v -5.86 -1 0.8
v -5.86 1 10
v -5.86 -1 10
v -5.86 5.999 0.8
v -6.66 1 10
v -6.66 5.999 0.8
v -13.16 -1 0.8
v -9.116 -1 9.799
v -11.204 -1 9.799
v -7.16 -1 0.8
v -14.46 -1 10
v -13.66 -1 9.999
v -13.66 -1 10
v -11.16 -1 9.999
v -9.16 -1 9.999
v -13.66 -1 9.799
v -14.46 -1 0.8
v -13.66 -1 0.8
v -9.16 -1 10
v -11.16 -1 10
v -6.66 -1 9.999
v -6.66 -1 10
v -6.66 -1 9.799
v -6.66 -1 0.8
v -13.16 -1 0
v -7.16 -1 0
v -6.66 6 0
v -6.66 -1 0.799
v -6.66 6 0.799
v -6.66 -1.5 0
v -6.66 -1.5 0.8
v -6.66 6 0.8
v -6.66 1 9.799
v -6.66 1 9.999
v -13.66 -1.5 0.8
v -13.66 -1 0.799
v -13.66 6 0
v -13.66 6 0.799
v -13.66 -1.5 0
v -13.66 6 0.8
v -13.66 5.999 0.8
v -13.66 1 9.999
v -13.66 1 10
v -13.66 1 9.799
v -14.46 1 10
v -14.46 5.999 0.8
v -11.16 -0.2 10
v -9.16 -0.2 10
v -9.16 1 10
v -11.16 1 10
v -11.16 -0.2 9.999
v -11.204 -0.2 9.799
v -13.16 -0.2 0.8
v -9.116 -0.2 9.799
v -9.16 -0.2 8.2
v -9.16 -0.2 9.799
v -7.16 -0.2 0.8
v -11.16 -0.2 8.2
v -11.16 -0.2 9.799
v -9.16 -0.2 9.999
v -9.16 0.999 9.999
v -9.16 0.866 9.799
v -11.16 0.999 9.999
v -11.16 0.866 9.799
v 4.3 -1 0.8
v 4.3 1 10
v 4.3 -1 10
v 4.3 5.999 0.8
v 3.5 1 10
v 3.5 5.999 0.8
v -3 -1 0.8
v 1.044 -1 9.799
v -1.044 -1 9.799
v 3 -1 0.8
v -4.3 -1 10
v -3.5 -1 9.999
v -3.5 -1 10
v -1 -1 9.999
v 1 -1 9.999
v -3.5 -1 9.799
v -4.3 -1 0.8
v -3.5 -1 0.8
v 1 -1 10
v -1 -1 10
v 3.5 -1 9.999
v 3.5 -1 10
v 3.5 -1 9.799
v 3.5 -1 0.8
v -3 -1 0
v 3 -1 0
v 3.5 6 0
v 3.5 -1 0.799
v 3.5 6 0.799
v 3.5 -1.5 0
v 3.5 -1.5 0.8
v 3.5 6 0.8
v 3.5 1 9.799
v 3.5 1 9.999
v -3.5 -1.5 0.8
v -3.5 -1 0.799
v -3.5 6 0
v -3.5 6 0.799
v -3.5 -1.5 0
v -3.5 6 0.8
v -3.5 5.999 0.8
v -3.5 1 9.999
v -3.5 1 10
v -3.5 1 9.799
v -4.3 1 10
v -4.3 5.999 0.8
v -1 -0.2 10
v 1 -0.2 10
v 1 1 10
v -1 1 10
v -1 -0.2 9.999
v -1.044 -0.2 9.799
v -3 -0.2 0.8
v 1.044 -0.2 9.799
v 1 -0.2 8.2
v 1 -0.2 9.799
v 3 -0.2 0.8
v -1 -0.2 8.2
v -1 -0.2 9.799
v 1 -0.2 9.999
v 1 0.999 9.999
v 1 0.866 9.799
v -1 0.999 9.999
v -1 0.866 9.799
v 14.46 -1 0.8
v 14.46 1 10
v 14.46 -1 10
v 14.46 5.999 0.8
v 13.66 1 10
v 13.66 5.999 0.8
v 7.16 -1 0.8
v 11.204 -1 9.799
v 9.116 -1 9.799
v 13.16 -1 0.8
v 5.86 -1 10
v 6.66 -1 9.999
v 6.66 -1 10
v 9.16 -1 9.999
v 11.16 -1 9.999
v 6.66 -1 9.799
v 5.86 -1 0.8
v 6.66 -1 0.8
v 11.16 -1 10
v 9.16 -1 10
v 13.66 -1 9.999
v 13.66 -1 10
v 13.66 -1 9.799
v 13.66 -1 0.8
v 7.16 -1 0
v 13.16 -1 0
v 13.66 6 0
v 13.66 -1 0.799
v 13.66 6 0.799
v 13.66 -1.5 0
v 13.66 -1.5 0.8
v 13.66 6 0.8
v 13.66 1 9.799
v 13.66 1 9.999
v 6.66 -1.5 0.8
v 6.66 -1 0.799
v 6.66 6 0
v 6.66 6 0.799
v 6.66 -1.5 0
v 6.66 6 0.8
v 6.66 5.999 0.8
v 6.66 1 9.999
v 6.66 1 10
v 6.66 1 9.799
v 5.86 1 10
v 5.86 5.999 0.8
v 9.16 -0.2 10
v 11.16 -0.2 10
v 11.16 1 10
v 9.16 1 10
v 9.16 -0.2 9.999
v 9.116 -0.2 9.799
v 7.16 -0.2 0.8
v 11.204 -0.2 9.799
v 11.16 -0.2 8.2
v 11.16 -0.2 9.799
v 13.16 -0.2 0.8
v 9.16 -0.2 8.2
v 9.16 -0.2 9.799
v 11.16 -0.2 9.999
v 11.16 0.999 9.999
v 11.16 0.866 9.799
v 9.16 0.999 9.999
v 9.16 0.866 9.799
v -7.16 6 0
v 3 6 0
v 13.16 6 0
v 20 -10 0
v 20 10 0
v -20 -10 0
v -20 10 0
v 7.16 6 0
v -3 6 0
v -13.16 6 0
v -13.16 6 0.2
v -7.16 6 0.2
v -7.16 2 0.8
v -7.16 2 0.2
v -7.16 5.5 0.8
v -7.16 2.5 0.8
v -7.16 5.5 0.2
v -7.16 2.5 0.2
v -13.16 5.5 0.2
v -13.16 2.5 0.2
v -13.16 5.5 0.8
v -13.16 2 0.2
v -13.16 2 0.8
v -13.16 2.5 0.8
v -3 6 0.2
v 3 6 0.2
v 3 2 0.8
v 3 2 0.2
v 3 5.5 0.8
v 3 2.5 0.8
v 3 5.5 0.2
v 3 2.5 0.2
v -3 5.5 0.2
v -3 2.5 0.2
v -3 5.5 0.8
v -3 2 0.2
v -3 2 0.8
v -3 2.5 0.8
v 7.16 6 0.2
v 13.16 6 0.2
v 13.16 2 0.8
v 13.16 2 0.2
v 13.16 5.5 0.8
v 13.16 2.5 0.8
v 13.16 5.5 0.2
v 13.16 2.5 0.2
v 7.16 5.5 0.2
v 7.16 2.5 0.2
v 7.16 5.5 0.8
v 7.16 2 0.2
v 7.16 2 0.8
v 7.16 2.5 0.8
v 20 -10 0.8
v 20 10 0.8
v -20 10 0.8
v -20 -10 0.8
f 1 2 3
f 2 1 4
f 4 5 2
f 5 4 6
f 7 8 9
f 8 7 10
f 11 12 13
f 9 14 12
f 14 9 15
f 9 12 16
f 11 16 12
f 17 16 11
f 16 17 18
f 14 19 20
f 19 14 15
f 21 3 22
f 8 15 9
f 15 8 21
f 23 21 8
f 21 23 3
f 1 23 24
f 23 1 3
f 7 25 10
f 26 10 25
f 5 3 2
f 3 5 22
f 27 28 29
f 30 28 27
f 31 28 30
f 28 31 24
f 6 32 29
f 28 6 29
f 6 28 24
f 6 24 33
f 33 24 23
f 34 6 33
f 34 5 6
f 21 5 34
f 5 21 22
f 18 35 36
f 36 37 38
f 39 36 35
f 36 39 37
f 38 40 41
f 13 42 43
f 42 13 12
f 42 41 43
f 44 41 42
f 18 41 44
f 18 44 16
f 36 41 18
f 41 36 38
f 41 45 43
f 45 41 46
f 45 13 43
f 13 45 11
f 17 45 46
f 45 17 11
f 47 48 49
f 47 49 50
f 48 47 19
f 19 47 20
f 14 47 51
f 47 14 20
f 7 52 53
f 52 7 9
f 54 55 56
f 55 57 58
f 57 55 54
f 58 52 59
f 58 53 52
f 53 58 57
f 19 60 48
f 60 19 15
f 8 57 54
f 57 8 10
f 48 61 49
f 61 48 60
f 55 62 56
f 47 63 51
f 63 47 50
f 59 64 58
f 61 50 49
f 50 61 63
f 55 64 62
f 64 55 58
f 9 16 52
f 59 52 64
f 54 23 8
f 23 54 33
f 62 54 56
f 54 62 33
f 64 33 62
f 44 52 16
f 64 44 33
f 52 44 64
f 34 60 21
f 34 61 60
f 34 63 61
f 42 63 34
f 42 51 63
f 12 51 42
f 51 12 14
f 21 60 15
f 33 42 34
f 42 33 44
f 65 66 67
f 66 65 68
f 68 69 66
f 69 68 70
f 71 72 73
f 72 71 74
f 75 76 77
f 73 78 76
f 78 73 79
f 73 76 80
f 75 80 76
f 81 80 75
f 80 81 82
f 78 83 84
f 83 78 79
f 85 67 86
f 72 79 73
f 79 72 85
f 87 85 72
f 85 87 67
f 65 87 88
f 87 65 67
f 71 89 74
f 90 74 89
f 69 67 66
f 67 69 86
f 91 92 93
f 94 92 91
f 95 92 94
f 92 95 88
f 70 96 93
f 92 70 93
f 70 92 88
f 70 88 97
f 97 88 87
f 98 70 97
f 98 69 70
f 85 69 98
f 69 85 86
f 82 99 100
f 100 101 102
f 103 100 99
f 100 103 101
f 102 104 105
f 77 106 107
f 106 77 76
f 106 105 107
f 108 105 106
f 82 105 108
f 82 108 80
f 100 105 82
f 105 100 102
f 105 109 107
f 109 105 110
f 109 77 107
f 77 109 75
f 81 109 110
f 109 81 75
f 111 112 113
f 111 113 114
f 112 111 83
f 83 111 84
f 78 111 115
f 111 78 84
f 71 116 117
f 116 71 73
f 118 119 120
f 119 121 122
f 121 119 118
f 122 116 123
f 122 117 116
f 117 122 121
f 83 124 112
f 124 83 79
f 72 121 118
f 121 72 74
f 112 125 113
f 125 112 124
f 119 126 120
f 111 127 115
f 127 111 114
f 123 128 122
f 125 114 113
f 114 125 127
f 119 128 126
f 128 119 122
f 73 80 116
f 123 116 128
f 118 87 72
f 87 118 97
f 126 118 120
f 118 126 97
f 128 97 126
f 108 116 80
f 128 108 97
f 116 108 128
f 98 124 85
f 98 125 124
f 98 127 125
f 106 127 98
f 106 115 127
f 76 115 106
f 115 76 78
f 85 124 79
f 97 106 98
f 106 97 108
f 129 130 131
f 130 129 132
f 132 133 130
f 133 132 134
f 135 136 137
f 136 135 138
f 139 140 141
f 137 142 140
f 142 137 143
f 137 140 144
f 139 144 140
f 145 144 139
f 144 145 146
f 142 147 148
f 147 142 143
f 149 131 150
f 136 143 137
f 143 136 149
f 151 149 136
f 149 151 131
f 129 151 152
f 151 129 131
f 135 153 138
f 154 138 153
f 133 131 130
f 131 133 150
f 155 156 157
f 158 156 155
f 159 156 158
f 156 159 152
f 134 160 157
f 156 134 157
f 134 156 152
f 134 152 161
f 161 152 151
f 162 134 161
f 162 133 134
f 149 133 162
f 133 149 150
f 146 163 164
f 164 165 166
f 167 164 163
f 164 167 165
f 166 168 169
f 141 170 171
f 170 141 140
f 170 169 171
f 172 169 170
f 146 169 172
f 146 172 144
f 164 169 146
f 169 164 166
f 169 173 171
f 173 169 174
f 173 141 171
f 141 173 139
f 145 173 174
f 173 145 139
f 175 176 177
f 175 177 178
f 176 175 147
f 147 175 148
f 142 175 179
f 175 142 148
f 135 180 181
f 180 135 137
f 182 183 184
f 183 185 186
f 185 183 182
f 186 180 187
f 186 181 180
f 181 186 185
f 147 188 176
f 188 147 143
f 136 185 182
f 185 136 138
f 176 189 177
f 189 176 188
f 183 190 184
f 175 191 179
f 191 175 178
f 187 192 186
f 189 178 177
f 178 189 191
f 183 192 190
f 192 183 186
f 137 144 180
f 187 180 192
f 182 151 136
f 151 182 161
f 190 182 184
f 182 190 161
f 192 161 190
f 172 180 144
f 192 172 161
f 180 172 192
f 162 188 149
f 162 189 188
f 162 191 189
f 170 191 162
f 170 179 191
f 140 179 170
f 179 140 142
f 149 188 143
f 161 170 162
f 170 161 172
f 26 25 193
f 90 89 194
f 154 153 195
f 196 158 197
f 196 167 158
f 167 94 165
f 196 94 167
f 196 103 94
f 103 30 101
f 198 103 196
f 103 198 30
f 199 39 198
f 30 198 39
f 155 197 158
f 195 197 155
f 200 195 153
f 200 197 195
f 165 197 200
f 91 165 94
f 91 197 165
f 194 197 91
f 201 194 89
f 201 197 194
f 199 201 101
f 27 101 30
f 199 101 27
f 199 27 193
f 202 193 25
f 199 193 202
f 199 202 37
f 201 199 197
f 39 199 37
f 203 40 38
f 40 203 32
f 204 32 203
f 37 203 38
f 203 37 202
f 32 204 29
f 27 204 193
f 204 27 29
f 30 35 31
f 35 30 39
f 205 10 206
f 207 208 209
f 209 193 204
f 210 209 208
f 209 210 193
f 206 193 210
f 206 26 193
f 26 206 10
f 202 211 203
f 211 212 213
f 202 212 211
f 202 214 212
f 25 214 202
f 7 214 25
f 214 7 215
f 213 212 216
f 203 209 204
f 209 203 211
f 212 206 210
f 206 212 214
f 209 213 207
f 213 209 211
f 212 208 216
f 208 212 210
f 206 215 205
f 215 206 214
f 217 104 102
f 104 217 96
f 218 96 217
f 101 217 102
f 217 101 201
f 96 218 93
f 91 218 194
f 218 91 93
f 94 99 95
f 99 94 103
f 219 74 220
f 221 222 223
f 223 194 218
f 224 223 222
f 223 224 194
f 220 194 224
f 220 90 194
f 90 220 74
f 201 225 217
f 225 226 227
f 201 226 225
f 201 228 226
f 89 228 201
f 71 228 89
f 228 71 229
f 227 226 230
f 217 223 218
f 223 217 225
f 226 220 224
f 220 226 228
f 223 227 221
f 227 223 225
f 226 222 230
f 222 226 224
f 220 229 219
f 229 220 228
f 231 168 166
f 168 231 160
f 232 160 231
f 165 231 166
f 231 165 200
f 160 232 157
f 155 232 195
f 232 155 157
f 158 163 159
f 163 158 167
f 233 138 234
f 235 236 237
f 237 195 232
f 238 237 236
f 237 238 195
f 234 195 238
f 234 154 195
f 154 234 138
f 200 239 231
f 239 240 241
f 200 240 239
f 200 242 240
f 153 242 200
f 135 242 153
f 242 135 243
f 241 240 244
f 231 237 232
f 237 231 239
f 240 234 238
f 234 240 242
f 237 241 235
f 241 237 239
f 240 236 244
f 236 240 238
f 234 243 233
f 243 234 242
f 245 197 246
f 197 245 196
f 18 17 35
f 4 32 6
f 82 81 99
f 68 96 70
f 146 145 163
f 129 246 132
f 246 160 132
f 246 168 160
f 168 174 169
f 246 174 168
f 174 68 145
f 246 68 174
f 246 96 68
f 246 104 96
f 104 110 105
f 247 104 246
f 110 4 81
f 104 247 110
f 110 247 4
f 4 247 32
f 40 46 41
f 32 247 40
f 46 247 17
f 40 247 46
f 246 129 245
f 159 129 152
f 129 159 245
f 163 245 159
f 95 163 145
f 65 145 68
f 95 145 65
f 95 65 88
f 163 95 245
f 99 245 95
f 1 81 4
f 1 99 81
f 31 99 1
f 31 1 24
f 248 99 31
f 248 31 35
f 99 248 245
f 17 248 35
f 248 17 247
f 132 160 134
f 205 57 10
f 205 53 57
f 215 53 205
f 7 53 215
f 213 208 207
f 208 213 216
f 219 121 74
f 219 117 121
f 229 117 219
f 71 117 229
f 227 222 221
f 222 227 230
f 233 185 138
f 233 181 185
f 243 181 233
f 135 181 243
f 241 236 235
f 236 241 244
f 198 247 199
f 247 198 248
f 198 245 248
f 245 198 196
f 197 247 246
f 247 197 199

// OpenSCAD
e=.001;

w=6;
d=7;
height=10;
thickness=.8;


module button_keepout(w, d, thickness, height, top_width=2, top_height=3, gap=0.5, flex_thickness=0.2)
{
rotate([0,0,180])
{
difference()
{
translate([0,(d-top_width)/2,-height-e])
linear_extrude(height+e)
	translate([-w/2-gap, -d/2-gap])
	square([w+2*gap, d+gap]);

translate([0,(d-top_width)/2,-thickness-e])
linear_extrude(thickness+2*e)
	translate([-w/2, -d/2])
	square([w, d+e]);
}

translate([0,(d-top_width)/2,-thickness-e])
linear_extrude(thickness-flex_thickness+e)
for (i=[d/2-gap, -gap])
translate([-w/2-gap, i])
square([w+2*gap, gap]);
}
}

module button_shape(w, d, thickness, height, top_width=2, top_height=3, gap=0.5, flex_thickness=0.2)
{

h=height-thickness;

rotate([0,0,180])
translate([0,(d-top_width)/2,-thickness+e])
{

translate([0,-d/2+thickness,0])
	rotate([90,0,0])
	linear_extrude(thickness)
	polygon([ [-w/2,0], [w/2, 0], [top_width/2, -h-e], [-top_width/2, -h-e]]);

for (i=[-w/2-gap-thickness, w/2+gap])
translate([i,0,0])
rotate([90,0,90])
	linear_extrude(thickness)
	polygon([ [-d/2,0], [d/2, 0], [-d/2+top_width, -h-e], [-d/2, -h-e]]);

translate([-top_width/2,0,0])
rotate([90,0,90])
	linear_extrude(top_width)
	polygon([ [-d/2, -h-e+top_height], [-d/2+top_width, -h-e], [-d/2, -h-e]]);


translate([-w/2-gap-e,-d/2,-h])
	cube([w+(gap+e)*2, top_width, flex_thickness]);

}
}


module flip()
{
	rotate([180,0,0]) children();
}

pitch=4*2.54;


flip()
{

for (i=[-pitch,0,pitch])
translate([i,0,0])
button_shape(w, d, thickness, height);

difference()
{
translate([-20,-10, -thickness])
cube([40,20,thickness]);
for (i=[-pitch,0,pitch])
translate([i,0,0])
button_keepout(w, d, thickness, height);
}
}
